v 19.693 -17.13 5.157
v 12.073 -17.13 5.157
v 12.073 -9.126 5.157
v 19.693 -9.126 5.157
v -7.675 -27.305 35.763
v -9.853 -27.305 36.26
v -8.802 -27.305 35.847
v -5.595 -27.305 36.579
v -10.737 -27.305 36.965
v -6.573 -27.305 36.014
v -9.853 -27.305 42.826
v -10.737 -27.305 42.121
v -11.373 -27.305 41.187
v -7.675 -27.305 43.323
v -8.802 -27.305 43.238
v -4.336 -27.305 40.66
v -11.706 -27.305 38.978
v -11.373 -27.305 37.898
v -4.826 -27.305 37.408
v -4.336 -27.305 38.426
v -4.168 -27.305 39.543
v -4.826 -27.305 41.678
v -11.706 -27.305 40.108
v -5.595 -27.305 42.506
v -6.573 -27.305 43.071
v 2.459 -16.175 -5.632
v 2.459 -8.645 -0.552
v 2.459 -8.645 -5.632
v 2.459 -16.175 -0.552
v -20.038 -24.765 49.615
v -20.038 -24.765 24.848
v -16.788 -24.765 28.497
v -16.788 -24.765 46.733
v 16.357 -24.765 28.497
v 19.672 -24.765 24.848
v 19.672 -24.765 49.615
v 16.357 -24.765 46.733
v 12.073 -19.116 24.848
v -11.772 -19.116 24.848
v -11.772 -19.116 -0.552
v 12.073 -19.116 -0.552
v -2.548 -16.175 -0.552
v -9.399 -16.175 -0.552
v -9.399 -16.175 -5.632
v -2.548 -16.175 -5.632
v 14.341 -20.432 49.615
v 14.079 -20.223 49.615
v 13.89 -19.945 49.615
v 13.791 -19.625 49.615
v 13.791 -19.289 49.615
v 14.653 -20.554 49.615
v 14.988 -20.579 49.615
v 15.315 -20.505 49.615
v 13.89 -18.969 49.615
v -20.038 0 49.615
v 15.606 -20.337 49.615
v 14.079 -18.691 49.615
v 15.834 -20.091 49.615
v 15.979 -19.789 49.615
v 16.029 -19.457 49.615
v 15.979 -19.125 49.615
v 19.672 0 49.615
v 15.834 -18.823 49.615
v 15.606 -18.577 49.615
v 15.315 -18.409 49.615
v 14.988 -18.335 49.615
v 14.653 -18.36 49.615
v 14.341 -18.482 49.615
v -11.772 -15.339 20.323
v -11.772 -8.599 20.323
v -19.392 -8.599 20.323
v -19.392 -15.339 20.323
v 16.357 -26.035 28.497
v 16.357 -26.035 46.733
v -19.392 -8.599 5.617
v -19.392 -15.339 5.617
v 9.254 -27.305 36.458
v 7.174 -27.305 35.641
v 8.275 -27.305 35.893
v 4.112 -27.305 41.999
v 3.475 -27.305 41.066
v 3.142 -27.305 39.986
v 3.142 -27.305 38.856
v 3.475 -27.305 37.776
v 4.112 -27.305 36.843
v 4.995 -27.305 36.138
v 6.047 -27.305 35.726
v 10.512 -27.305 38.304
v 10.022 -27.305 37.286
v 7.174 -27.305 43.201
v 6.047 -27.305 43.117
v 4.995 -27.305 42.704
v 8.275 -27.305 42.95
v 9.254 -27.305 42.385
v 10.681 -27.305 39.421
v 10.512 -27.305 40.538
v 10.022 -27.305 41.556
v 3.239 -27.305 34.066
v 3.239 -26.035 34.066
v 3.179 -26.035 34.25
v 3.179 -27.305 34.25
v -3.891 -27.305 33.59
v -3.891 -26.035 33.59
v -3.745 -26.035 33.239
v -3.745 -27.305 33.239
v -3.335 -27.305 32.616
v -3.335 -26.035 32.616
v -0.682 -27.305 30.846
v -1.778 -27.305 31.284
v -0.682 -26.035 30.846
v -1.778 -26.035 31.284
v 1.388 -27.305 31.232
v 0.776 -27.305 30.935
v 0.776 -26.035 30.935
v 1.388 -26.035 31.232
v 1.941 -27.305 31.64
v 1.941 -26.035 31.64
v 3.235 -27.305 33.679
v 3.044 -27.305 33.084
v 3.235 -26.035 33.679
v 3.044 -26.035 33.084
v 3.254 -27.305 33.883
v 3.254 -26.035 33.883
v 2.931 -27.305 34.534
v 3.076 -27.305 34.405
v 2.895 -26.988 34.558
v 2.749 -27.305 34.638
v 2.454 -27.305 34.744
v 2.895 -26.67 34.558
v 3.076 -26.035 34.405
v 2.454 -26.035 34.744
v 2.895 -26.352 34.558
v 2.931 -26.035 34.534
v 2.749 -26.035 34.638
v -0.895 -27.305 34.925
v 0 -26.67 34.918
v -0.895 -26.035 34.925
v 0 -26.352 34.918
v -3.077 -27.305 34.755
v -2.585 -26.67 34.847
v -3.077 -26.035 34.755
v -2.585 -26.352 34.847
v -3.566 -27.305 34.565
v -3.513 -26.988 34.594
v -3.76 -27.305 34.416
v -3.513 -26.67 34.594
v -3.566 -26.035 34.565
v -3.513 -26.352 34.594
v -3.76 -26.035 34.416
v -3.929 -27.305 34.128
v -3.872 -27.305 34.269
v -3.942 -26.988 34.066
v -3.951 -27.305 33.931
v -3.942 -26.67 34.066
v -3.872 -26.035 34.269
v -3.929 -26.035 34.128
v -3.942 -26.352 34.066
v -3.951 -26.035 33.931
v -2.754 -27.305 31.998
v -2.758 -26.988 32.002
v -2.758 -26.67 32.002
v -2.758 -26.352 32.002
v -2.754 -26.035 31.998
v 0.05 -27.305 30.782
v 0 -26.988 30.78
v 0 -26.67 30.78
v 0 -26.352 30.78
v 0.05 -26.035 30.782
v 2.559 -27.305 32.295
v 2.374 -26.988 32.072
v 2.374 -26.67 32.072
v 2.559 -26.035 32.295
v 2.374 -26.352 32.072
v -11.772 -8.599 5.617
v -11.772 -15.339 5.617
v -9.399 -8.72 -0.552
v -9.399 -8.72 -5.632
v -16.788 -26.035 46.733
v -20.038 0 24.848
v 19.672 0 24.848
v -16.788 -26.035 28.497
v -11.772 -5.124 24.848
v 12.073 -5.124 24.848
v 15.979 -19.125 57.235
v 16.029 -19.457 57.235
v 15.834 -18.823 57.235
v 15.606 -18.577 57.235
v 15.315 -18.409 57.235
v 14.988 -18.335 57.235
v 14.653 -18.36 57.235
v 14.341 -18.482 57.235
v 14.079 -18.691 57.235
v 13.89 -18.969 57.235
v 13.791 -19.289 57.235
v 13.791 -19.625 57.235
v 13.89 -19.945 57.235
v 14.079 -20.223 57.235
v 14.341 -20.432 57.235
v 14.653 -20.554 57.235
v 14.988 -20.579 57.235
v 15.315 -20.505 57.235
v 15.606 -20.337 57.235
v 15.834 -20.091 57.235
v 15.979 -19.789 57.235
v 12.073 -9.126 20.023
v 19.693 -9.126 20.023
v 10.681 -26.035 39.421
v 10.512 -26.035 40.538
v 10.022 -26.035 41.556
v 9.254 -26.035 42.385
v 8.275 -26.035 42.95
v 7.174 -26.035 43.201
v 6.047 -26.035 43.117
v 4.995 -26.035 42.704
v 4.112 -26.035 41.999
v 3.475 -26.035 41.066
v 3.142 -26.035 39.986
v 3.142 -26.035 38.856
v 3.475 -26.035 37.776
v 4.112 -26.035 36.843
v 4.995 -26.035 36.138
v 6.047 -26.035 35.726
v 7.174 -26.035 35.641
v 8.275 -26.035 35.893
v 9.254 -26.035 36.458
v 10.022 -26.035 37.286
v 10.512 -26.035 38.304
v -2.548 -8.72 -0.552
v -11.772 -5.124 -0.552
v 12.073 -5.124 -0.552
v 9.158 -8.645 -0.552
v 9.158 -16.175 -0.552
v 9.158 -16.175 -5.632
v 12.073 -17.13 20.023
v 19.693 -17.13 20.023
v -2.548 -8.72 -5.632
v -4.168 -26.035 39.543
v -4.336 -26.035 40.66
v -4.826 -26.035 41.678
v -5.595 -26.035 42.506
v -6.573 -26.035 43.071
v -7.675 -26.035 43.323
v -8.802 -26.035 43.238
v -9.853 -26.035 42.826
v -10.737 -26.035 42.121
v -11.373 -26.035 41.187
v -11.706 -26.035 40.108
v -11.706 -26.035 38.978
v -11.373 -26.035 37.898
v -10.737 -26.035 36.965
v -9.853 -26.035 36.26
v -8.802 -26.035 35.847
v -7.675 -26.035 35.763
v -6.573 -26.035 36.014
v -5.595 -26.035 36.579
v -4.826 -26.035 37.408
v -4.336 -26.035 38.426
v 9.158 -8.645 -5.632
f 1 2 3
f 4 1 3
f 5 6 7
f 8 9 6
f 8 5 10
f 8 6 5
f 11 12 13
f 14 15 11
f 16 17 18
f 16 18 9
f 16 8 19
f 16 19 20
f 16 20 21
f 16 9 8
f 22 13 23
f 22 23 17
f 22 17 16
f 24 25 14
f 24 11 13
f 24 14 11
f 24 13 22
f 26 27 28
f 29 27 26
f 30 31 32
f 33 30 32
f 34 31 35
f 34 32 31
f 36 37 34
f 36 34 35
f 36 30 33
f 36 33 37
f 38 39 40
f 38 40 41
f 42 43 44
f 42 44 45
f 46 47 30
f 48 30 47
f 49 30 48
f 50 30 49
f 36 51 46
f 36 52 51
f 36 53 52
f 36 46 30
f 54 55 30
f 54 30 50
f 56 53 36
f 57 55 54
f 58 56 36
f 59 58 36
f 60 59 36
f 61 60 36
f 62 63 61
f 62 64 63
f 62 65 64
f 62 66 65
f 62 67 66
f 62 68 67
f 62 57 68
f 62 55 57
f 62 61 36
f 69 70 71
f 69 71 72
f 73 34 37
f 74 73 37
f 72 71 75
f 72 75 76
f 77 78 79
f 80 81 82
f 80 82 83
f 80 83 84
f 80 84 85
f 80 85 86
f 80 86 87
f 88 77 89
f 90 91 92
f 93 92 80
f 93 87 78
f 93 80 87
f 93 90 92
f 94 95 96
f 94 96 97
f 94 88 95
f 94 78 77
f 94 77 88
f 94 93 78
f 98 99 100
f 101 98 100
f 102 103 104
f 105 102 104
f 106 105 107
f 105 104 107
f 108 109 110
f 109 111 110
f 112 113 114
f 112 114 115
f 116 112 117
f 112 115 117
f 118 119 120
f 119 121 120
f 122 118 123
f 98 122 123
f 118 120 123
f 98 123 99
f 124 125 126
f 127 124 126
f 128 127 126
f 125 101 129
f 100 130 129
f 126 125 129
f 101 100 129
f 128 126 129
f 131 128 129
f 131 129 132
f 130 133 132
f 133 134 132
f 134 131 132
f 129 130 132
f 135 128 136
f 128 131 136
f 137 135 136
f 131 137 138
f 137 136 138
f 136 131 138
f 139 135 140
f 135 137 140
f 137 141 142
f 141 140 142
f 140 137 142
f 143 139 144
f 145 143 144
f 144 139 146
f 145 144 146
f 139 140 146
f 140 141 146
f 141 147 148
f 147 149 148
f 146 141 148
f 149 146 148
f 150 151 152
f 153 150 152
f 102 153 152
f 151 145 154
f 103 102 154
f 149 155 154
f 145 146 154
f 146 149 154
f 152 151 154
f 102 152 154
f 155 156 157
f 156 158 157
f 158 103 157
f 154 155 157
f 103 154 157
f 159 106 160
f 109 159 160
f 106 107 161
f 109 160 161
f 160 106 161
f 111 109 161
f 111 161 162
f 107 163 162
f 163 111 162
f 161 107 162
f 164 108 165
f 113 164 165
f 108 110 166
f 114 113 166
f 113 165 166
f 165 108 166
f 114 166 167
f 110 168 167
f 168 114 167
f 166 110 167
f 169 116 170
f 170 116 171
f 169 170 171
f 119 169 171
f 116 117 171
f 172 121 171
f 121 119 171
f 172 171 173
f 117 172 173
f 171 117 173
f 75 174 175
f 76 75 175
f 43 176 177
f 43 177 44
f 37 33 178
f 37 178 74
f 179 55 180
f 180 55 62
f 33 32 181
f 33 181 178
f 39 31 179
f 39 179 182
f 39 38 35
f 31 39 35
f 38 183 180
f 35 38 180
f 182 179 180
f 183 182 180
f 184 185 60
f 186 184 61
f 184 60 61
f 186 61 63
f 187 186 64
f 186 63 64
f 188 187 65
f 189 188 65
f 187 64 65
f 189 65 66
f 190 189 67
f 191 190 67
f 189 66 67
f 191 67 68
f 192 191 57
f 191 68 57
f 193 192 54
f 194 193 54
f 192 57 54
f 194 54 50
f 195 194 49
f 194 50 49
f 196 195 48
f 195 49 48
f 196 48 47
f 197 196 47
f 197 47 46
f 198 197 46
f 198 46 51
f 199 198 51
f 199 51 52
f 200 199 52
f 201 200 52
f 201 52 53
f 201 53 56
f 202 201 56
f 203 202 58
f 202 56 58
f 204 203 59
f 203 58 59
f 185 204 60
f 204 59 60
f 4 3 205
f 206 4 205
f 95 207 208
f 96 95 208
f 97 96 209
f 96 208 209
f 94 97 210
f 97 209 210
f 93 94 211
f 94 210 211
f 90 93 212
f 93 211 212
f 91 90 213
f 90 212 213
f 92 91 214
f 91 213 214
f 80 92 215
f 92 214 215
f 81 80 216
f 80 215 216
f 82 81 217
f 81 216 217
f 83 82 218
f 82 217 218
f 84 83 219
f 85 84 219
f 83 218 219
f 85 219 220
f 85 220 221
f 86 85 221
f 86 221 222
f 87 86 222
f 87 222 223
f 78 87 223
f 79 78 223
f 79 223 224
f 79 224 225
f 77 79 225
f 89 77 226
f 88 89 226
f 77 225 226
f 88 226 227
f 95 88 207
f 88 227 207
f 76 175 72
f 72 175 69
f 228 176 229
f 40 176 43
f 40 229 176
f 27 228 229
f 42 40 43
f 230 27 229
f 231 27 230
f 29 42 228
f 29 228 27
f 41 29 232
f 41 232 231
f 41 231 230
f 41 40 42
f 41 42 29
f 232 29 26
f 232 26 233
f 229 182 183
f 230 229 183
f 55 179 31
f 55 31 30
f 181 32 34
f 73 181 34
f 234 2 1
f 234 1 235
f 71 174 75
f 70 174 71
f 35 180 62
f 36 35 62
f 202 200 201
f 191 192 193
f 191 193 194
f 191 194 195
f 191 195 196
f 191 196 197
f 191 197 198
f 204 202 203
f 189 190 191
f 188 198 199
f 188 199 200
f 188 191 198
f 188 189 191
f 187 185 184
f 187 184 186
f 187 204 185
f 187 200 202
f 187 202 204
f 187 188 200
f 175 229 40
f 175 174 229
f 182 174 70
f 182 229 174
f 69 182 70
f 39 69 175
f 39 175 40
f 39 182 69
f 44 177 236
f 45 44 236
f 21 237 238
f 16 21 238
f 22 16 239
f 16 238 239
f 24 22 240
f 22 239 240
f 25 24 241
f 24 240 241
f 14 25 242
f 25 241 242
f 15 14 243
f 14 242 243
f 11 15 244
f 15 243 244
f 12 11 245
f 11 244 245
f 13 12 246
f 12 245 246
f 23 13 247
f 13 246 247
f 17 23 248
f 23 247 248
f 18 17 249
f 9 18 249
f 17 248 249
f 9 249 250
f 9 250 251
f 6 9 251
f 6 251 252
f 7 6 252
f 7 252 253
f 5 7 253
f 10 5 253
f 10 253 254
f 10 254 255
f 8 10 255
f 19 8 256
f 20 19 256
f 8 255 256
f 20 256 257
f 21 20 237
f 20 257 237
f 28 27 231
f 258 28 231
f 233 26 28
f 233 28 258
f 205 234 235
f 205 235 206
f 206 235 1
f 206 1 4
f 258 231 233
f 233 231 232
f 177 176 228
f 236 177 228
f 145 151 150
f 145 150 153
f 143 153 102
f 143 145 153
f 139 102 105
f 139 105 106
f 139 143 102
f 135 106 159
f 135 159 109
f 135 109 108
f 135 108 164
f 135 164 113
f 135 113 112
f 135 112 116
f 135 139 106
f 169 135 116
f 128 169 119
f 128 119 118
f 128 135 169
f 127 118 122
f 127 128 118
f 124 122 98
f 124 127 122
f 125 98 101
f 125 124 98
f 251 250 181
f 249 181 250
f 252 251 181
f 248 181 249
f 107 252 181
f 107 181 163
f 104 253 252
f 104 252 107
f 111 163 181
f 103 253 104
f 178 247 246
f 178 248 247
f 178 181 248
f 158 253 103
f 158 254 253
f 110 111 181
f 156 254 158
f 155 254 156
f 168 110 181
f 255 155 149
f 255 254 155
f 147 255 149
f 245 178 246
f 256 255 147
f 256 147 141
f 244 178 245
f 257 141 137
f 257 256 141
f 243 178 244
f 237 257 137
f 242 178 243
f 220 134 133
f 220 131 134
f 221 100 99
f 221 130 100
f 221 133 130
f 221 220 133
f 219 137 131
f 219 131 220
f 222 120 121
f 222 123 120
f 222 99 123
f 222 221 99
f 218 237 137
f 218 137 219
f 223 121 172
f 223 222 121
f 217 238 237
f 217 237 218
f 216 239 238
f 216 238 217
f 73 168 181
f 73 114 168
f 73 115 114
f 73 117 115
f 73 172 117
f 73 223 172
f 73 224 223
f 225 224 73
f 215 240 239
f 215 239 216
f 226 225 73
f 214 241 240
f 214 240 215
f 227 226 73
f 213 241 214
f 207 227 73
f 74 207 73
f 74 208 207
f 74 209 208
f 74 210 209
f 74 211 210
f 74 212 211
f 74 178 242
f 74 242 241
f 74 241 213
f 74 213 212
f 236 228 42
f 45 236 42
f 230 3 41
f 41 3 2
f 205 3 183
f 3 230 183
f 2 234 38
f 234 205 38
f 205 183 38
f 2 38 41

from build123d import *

# Parameters (mm, degrees)
F0_W      = 39.7095009685
F0_H      = 24.7672665864
F1_DEPTH  = 24.765
F2_W      = 23.8453457132
F2_H      = 13.9918969944
F3_DEPTH  = 25.4
F4_W      = 6.7402645946
F4_H      = 14.7056742571
F5_DEPTH  = 7.62
F6_W      = 8.0039296299
F6_H      = 14.8659497499
F7_DEPTH  = 7.62
F8_W      = 6.8519285414
F8_H      = 7.4549559504
F8_W_2    = 6.698246114
F8_H_2    = 7.5303334743
F9_DEPTH  = 5.08
F10_W     = 33.1446304917
F10_H     = 18.2367824018
F11_DEPTH = 1.27
F12_R     = 3.790583573
F12_R_2   = 3.790584201
F13_DEPTH = 1.27
F14_R     = 1.1256242995
F15_DEPTH = 7.62


with BuildPart() as f1:
    # F0 (on Front) → F1 (new body)
    with BuildSketch(Plane.XZ):
        with Locations((-0.1829620451, 37.2313475236)):
            Rectangle(F0_W, F0_H)
    extrude(amount=F1_DEPTH)

    # F2 (on face) → F3 (join)
    with BuildSketch(Plane(origin=(0, 0, 24.8477142304), x_dir=(1, 0, 0), z_dir=(0, 0, -1))):
        with Locations((0.1507359557, 12.1197416447)):
            Rectangle(F2_W, F2_H)
    extrude(amount=F3_DEPTH)

    # F4 (on face) → F5 (join)
    with BuildSketch(Plane(origin=(-11.7719369009, 0, 0), x_dir=(0, -1, 0), z_dir=(-1, 0, 0))):
        with Locations((11.9688315317, 12.9703220446)):
            Rectangle(F4_W, F4_H)
    extrude(amount=F5_DEPTH)

    # F6 (on face) → F7 (join)
    with BuildSketch(Plane.YZ.offset(12.0734088123)):
        with Locations((-13.127992861, 12.5903561711)):
            Rectangle(F6_W, F6_H)
    extrude(amount=F7_DEPTH)

    # F8 (on face) → F9 (join)
    with BuildSketch(Plane(origin=(0, 0, -0.5522857696), x_dir=(1, 0, 0), z_dir=(0, 0, -1))):
        with Locations((-5.9734758688, 12.4474996701)):
            Rectangle(F8_W, F8_H)
        with Locations((5.8084283955, 12.4098109081)):
            Rectangle(F8_W_2, F8_H_2)
    extrude(amount=F9_DEPTH)

    # F10 (on face) → F11 (join)
    with BuildSketch(Plane.XZ.offset(24.765)):
        with Locations((-0.2155154943, 37.6151073724)):
            Rectangle(F10_W, F10_H)
    extrude(amount=F11_DEPTH)

    # F12 (on face) → F13 (join)
    with BuildSketch(Plane.XZ.offset(26.035)):
        with Locations((-7.9581402242, 39.5428165793)):
            Circle(F12_R)
        with Locations((6.8902717903, 39.42110762)):
            Circle(F12_R_2)
        with BuildLine():
            add(Edge.make_bspline(
                [(3.2390230335, 34.0659432113), (3.0810302353, 34.9220679818), (0.036704506, 34.8800177819), (-6.049244101, 35.0644989514), (0.143997862, 28.5163578143), (3.4244660087, 33.0610725698), (3.2390230335, 34.0659432113)],
                knots=[0, 0, 0, 0, 0.2217830764, 0.4651495707, 0.7396836186, 1, 1, 1, 1], degree=3))
        make_face()
    extrude(amount=F13_DEPTH)

    # F14 (on face) → F15 (join)
    with BuildSketch(Plane.XY.offset(49.6149808168)):
        with Locations((14.9038648233, -19.4570012391)):
            Circle(F14_R)
    extrude(amount=F15_DEPTH)


solid = f1.part
